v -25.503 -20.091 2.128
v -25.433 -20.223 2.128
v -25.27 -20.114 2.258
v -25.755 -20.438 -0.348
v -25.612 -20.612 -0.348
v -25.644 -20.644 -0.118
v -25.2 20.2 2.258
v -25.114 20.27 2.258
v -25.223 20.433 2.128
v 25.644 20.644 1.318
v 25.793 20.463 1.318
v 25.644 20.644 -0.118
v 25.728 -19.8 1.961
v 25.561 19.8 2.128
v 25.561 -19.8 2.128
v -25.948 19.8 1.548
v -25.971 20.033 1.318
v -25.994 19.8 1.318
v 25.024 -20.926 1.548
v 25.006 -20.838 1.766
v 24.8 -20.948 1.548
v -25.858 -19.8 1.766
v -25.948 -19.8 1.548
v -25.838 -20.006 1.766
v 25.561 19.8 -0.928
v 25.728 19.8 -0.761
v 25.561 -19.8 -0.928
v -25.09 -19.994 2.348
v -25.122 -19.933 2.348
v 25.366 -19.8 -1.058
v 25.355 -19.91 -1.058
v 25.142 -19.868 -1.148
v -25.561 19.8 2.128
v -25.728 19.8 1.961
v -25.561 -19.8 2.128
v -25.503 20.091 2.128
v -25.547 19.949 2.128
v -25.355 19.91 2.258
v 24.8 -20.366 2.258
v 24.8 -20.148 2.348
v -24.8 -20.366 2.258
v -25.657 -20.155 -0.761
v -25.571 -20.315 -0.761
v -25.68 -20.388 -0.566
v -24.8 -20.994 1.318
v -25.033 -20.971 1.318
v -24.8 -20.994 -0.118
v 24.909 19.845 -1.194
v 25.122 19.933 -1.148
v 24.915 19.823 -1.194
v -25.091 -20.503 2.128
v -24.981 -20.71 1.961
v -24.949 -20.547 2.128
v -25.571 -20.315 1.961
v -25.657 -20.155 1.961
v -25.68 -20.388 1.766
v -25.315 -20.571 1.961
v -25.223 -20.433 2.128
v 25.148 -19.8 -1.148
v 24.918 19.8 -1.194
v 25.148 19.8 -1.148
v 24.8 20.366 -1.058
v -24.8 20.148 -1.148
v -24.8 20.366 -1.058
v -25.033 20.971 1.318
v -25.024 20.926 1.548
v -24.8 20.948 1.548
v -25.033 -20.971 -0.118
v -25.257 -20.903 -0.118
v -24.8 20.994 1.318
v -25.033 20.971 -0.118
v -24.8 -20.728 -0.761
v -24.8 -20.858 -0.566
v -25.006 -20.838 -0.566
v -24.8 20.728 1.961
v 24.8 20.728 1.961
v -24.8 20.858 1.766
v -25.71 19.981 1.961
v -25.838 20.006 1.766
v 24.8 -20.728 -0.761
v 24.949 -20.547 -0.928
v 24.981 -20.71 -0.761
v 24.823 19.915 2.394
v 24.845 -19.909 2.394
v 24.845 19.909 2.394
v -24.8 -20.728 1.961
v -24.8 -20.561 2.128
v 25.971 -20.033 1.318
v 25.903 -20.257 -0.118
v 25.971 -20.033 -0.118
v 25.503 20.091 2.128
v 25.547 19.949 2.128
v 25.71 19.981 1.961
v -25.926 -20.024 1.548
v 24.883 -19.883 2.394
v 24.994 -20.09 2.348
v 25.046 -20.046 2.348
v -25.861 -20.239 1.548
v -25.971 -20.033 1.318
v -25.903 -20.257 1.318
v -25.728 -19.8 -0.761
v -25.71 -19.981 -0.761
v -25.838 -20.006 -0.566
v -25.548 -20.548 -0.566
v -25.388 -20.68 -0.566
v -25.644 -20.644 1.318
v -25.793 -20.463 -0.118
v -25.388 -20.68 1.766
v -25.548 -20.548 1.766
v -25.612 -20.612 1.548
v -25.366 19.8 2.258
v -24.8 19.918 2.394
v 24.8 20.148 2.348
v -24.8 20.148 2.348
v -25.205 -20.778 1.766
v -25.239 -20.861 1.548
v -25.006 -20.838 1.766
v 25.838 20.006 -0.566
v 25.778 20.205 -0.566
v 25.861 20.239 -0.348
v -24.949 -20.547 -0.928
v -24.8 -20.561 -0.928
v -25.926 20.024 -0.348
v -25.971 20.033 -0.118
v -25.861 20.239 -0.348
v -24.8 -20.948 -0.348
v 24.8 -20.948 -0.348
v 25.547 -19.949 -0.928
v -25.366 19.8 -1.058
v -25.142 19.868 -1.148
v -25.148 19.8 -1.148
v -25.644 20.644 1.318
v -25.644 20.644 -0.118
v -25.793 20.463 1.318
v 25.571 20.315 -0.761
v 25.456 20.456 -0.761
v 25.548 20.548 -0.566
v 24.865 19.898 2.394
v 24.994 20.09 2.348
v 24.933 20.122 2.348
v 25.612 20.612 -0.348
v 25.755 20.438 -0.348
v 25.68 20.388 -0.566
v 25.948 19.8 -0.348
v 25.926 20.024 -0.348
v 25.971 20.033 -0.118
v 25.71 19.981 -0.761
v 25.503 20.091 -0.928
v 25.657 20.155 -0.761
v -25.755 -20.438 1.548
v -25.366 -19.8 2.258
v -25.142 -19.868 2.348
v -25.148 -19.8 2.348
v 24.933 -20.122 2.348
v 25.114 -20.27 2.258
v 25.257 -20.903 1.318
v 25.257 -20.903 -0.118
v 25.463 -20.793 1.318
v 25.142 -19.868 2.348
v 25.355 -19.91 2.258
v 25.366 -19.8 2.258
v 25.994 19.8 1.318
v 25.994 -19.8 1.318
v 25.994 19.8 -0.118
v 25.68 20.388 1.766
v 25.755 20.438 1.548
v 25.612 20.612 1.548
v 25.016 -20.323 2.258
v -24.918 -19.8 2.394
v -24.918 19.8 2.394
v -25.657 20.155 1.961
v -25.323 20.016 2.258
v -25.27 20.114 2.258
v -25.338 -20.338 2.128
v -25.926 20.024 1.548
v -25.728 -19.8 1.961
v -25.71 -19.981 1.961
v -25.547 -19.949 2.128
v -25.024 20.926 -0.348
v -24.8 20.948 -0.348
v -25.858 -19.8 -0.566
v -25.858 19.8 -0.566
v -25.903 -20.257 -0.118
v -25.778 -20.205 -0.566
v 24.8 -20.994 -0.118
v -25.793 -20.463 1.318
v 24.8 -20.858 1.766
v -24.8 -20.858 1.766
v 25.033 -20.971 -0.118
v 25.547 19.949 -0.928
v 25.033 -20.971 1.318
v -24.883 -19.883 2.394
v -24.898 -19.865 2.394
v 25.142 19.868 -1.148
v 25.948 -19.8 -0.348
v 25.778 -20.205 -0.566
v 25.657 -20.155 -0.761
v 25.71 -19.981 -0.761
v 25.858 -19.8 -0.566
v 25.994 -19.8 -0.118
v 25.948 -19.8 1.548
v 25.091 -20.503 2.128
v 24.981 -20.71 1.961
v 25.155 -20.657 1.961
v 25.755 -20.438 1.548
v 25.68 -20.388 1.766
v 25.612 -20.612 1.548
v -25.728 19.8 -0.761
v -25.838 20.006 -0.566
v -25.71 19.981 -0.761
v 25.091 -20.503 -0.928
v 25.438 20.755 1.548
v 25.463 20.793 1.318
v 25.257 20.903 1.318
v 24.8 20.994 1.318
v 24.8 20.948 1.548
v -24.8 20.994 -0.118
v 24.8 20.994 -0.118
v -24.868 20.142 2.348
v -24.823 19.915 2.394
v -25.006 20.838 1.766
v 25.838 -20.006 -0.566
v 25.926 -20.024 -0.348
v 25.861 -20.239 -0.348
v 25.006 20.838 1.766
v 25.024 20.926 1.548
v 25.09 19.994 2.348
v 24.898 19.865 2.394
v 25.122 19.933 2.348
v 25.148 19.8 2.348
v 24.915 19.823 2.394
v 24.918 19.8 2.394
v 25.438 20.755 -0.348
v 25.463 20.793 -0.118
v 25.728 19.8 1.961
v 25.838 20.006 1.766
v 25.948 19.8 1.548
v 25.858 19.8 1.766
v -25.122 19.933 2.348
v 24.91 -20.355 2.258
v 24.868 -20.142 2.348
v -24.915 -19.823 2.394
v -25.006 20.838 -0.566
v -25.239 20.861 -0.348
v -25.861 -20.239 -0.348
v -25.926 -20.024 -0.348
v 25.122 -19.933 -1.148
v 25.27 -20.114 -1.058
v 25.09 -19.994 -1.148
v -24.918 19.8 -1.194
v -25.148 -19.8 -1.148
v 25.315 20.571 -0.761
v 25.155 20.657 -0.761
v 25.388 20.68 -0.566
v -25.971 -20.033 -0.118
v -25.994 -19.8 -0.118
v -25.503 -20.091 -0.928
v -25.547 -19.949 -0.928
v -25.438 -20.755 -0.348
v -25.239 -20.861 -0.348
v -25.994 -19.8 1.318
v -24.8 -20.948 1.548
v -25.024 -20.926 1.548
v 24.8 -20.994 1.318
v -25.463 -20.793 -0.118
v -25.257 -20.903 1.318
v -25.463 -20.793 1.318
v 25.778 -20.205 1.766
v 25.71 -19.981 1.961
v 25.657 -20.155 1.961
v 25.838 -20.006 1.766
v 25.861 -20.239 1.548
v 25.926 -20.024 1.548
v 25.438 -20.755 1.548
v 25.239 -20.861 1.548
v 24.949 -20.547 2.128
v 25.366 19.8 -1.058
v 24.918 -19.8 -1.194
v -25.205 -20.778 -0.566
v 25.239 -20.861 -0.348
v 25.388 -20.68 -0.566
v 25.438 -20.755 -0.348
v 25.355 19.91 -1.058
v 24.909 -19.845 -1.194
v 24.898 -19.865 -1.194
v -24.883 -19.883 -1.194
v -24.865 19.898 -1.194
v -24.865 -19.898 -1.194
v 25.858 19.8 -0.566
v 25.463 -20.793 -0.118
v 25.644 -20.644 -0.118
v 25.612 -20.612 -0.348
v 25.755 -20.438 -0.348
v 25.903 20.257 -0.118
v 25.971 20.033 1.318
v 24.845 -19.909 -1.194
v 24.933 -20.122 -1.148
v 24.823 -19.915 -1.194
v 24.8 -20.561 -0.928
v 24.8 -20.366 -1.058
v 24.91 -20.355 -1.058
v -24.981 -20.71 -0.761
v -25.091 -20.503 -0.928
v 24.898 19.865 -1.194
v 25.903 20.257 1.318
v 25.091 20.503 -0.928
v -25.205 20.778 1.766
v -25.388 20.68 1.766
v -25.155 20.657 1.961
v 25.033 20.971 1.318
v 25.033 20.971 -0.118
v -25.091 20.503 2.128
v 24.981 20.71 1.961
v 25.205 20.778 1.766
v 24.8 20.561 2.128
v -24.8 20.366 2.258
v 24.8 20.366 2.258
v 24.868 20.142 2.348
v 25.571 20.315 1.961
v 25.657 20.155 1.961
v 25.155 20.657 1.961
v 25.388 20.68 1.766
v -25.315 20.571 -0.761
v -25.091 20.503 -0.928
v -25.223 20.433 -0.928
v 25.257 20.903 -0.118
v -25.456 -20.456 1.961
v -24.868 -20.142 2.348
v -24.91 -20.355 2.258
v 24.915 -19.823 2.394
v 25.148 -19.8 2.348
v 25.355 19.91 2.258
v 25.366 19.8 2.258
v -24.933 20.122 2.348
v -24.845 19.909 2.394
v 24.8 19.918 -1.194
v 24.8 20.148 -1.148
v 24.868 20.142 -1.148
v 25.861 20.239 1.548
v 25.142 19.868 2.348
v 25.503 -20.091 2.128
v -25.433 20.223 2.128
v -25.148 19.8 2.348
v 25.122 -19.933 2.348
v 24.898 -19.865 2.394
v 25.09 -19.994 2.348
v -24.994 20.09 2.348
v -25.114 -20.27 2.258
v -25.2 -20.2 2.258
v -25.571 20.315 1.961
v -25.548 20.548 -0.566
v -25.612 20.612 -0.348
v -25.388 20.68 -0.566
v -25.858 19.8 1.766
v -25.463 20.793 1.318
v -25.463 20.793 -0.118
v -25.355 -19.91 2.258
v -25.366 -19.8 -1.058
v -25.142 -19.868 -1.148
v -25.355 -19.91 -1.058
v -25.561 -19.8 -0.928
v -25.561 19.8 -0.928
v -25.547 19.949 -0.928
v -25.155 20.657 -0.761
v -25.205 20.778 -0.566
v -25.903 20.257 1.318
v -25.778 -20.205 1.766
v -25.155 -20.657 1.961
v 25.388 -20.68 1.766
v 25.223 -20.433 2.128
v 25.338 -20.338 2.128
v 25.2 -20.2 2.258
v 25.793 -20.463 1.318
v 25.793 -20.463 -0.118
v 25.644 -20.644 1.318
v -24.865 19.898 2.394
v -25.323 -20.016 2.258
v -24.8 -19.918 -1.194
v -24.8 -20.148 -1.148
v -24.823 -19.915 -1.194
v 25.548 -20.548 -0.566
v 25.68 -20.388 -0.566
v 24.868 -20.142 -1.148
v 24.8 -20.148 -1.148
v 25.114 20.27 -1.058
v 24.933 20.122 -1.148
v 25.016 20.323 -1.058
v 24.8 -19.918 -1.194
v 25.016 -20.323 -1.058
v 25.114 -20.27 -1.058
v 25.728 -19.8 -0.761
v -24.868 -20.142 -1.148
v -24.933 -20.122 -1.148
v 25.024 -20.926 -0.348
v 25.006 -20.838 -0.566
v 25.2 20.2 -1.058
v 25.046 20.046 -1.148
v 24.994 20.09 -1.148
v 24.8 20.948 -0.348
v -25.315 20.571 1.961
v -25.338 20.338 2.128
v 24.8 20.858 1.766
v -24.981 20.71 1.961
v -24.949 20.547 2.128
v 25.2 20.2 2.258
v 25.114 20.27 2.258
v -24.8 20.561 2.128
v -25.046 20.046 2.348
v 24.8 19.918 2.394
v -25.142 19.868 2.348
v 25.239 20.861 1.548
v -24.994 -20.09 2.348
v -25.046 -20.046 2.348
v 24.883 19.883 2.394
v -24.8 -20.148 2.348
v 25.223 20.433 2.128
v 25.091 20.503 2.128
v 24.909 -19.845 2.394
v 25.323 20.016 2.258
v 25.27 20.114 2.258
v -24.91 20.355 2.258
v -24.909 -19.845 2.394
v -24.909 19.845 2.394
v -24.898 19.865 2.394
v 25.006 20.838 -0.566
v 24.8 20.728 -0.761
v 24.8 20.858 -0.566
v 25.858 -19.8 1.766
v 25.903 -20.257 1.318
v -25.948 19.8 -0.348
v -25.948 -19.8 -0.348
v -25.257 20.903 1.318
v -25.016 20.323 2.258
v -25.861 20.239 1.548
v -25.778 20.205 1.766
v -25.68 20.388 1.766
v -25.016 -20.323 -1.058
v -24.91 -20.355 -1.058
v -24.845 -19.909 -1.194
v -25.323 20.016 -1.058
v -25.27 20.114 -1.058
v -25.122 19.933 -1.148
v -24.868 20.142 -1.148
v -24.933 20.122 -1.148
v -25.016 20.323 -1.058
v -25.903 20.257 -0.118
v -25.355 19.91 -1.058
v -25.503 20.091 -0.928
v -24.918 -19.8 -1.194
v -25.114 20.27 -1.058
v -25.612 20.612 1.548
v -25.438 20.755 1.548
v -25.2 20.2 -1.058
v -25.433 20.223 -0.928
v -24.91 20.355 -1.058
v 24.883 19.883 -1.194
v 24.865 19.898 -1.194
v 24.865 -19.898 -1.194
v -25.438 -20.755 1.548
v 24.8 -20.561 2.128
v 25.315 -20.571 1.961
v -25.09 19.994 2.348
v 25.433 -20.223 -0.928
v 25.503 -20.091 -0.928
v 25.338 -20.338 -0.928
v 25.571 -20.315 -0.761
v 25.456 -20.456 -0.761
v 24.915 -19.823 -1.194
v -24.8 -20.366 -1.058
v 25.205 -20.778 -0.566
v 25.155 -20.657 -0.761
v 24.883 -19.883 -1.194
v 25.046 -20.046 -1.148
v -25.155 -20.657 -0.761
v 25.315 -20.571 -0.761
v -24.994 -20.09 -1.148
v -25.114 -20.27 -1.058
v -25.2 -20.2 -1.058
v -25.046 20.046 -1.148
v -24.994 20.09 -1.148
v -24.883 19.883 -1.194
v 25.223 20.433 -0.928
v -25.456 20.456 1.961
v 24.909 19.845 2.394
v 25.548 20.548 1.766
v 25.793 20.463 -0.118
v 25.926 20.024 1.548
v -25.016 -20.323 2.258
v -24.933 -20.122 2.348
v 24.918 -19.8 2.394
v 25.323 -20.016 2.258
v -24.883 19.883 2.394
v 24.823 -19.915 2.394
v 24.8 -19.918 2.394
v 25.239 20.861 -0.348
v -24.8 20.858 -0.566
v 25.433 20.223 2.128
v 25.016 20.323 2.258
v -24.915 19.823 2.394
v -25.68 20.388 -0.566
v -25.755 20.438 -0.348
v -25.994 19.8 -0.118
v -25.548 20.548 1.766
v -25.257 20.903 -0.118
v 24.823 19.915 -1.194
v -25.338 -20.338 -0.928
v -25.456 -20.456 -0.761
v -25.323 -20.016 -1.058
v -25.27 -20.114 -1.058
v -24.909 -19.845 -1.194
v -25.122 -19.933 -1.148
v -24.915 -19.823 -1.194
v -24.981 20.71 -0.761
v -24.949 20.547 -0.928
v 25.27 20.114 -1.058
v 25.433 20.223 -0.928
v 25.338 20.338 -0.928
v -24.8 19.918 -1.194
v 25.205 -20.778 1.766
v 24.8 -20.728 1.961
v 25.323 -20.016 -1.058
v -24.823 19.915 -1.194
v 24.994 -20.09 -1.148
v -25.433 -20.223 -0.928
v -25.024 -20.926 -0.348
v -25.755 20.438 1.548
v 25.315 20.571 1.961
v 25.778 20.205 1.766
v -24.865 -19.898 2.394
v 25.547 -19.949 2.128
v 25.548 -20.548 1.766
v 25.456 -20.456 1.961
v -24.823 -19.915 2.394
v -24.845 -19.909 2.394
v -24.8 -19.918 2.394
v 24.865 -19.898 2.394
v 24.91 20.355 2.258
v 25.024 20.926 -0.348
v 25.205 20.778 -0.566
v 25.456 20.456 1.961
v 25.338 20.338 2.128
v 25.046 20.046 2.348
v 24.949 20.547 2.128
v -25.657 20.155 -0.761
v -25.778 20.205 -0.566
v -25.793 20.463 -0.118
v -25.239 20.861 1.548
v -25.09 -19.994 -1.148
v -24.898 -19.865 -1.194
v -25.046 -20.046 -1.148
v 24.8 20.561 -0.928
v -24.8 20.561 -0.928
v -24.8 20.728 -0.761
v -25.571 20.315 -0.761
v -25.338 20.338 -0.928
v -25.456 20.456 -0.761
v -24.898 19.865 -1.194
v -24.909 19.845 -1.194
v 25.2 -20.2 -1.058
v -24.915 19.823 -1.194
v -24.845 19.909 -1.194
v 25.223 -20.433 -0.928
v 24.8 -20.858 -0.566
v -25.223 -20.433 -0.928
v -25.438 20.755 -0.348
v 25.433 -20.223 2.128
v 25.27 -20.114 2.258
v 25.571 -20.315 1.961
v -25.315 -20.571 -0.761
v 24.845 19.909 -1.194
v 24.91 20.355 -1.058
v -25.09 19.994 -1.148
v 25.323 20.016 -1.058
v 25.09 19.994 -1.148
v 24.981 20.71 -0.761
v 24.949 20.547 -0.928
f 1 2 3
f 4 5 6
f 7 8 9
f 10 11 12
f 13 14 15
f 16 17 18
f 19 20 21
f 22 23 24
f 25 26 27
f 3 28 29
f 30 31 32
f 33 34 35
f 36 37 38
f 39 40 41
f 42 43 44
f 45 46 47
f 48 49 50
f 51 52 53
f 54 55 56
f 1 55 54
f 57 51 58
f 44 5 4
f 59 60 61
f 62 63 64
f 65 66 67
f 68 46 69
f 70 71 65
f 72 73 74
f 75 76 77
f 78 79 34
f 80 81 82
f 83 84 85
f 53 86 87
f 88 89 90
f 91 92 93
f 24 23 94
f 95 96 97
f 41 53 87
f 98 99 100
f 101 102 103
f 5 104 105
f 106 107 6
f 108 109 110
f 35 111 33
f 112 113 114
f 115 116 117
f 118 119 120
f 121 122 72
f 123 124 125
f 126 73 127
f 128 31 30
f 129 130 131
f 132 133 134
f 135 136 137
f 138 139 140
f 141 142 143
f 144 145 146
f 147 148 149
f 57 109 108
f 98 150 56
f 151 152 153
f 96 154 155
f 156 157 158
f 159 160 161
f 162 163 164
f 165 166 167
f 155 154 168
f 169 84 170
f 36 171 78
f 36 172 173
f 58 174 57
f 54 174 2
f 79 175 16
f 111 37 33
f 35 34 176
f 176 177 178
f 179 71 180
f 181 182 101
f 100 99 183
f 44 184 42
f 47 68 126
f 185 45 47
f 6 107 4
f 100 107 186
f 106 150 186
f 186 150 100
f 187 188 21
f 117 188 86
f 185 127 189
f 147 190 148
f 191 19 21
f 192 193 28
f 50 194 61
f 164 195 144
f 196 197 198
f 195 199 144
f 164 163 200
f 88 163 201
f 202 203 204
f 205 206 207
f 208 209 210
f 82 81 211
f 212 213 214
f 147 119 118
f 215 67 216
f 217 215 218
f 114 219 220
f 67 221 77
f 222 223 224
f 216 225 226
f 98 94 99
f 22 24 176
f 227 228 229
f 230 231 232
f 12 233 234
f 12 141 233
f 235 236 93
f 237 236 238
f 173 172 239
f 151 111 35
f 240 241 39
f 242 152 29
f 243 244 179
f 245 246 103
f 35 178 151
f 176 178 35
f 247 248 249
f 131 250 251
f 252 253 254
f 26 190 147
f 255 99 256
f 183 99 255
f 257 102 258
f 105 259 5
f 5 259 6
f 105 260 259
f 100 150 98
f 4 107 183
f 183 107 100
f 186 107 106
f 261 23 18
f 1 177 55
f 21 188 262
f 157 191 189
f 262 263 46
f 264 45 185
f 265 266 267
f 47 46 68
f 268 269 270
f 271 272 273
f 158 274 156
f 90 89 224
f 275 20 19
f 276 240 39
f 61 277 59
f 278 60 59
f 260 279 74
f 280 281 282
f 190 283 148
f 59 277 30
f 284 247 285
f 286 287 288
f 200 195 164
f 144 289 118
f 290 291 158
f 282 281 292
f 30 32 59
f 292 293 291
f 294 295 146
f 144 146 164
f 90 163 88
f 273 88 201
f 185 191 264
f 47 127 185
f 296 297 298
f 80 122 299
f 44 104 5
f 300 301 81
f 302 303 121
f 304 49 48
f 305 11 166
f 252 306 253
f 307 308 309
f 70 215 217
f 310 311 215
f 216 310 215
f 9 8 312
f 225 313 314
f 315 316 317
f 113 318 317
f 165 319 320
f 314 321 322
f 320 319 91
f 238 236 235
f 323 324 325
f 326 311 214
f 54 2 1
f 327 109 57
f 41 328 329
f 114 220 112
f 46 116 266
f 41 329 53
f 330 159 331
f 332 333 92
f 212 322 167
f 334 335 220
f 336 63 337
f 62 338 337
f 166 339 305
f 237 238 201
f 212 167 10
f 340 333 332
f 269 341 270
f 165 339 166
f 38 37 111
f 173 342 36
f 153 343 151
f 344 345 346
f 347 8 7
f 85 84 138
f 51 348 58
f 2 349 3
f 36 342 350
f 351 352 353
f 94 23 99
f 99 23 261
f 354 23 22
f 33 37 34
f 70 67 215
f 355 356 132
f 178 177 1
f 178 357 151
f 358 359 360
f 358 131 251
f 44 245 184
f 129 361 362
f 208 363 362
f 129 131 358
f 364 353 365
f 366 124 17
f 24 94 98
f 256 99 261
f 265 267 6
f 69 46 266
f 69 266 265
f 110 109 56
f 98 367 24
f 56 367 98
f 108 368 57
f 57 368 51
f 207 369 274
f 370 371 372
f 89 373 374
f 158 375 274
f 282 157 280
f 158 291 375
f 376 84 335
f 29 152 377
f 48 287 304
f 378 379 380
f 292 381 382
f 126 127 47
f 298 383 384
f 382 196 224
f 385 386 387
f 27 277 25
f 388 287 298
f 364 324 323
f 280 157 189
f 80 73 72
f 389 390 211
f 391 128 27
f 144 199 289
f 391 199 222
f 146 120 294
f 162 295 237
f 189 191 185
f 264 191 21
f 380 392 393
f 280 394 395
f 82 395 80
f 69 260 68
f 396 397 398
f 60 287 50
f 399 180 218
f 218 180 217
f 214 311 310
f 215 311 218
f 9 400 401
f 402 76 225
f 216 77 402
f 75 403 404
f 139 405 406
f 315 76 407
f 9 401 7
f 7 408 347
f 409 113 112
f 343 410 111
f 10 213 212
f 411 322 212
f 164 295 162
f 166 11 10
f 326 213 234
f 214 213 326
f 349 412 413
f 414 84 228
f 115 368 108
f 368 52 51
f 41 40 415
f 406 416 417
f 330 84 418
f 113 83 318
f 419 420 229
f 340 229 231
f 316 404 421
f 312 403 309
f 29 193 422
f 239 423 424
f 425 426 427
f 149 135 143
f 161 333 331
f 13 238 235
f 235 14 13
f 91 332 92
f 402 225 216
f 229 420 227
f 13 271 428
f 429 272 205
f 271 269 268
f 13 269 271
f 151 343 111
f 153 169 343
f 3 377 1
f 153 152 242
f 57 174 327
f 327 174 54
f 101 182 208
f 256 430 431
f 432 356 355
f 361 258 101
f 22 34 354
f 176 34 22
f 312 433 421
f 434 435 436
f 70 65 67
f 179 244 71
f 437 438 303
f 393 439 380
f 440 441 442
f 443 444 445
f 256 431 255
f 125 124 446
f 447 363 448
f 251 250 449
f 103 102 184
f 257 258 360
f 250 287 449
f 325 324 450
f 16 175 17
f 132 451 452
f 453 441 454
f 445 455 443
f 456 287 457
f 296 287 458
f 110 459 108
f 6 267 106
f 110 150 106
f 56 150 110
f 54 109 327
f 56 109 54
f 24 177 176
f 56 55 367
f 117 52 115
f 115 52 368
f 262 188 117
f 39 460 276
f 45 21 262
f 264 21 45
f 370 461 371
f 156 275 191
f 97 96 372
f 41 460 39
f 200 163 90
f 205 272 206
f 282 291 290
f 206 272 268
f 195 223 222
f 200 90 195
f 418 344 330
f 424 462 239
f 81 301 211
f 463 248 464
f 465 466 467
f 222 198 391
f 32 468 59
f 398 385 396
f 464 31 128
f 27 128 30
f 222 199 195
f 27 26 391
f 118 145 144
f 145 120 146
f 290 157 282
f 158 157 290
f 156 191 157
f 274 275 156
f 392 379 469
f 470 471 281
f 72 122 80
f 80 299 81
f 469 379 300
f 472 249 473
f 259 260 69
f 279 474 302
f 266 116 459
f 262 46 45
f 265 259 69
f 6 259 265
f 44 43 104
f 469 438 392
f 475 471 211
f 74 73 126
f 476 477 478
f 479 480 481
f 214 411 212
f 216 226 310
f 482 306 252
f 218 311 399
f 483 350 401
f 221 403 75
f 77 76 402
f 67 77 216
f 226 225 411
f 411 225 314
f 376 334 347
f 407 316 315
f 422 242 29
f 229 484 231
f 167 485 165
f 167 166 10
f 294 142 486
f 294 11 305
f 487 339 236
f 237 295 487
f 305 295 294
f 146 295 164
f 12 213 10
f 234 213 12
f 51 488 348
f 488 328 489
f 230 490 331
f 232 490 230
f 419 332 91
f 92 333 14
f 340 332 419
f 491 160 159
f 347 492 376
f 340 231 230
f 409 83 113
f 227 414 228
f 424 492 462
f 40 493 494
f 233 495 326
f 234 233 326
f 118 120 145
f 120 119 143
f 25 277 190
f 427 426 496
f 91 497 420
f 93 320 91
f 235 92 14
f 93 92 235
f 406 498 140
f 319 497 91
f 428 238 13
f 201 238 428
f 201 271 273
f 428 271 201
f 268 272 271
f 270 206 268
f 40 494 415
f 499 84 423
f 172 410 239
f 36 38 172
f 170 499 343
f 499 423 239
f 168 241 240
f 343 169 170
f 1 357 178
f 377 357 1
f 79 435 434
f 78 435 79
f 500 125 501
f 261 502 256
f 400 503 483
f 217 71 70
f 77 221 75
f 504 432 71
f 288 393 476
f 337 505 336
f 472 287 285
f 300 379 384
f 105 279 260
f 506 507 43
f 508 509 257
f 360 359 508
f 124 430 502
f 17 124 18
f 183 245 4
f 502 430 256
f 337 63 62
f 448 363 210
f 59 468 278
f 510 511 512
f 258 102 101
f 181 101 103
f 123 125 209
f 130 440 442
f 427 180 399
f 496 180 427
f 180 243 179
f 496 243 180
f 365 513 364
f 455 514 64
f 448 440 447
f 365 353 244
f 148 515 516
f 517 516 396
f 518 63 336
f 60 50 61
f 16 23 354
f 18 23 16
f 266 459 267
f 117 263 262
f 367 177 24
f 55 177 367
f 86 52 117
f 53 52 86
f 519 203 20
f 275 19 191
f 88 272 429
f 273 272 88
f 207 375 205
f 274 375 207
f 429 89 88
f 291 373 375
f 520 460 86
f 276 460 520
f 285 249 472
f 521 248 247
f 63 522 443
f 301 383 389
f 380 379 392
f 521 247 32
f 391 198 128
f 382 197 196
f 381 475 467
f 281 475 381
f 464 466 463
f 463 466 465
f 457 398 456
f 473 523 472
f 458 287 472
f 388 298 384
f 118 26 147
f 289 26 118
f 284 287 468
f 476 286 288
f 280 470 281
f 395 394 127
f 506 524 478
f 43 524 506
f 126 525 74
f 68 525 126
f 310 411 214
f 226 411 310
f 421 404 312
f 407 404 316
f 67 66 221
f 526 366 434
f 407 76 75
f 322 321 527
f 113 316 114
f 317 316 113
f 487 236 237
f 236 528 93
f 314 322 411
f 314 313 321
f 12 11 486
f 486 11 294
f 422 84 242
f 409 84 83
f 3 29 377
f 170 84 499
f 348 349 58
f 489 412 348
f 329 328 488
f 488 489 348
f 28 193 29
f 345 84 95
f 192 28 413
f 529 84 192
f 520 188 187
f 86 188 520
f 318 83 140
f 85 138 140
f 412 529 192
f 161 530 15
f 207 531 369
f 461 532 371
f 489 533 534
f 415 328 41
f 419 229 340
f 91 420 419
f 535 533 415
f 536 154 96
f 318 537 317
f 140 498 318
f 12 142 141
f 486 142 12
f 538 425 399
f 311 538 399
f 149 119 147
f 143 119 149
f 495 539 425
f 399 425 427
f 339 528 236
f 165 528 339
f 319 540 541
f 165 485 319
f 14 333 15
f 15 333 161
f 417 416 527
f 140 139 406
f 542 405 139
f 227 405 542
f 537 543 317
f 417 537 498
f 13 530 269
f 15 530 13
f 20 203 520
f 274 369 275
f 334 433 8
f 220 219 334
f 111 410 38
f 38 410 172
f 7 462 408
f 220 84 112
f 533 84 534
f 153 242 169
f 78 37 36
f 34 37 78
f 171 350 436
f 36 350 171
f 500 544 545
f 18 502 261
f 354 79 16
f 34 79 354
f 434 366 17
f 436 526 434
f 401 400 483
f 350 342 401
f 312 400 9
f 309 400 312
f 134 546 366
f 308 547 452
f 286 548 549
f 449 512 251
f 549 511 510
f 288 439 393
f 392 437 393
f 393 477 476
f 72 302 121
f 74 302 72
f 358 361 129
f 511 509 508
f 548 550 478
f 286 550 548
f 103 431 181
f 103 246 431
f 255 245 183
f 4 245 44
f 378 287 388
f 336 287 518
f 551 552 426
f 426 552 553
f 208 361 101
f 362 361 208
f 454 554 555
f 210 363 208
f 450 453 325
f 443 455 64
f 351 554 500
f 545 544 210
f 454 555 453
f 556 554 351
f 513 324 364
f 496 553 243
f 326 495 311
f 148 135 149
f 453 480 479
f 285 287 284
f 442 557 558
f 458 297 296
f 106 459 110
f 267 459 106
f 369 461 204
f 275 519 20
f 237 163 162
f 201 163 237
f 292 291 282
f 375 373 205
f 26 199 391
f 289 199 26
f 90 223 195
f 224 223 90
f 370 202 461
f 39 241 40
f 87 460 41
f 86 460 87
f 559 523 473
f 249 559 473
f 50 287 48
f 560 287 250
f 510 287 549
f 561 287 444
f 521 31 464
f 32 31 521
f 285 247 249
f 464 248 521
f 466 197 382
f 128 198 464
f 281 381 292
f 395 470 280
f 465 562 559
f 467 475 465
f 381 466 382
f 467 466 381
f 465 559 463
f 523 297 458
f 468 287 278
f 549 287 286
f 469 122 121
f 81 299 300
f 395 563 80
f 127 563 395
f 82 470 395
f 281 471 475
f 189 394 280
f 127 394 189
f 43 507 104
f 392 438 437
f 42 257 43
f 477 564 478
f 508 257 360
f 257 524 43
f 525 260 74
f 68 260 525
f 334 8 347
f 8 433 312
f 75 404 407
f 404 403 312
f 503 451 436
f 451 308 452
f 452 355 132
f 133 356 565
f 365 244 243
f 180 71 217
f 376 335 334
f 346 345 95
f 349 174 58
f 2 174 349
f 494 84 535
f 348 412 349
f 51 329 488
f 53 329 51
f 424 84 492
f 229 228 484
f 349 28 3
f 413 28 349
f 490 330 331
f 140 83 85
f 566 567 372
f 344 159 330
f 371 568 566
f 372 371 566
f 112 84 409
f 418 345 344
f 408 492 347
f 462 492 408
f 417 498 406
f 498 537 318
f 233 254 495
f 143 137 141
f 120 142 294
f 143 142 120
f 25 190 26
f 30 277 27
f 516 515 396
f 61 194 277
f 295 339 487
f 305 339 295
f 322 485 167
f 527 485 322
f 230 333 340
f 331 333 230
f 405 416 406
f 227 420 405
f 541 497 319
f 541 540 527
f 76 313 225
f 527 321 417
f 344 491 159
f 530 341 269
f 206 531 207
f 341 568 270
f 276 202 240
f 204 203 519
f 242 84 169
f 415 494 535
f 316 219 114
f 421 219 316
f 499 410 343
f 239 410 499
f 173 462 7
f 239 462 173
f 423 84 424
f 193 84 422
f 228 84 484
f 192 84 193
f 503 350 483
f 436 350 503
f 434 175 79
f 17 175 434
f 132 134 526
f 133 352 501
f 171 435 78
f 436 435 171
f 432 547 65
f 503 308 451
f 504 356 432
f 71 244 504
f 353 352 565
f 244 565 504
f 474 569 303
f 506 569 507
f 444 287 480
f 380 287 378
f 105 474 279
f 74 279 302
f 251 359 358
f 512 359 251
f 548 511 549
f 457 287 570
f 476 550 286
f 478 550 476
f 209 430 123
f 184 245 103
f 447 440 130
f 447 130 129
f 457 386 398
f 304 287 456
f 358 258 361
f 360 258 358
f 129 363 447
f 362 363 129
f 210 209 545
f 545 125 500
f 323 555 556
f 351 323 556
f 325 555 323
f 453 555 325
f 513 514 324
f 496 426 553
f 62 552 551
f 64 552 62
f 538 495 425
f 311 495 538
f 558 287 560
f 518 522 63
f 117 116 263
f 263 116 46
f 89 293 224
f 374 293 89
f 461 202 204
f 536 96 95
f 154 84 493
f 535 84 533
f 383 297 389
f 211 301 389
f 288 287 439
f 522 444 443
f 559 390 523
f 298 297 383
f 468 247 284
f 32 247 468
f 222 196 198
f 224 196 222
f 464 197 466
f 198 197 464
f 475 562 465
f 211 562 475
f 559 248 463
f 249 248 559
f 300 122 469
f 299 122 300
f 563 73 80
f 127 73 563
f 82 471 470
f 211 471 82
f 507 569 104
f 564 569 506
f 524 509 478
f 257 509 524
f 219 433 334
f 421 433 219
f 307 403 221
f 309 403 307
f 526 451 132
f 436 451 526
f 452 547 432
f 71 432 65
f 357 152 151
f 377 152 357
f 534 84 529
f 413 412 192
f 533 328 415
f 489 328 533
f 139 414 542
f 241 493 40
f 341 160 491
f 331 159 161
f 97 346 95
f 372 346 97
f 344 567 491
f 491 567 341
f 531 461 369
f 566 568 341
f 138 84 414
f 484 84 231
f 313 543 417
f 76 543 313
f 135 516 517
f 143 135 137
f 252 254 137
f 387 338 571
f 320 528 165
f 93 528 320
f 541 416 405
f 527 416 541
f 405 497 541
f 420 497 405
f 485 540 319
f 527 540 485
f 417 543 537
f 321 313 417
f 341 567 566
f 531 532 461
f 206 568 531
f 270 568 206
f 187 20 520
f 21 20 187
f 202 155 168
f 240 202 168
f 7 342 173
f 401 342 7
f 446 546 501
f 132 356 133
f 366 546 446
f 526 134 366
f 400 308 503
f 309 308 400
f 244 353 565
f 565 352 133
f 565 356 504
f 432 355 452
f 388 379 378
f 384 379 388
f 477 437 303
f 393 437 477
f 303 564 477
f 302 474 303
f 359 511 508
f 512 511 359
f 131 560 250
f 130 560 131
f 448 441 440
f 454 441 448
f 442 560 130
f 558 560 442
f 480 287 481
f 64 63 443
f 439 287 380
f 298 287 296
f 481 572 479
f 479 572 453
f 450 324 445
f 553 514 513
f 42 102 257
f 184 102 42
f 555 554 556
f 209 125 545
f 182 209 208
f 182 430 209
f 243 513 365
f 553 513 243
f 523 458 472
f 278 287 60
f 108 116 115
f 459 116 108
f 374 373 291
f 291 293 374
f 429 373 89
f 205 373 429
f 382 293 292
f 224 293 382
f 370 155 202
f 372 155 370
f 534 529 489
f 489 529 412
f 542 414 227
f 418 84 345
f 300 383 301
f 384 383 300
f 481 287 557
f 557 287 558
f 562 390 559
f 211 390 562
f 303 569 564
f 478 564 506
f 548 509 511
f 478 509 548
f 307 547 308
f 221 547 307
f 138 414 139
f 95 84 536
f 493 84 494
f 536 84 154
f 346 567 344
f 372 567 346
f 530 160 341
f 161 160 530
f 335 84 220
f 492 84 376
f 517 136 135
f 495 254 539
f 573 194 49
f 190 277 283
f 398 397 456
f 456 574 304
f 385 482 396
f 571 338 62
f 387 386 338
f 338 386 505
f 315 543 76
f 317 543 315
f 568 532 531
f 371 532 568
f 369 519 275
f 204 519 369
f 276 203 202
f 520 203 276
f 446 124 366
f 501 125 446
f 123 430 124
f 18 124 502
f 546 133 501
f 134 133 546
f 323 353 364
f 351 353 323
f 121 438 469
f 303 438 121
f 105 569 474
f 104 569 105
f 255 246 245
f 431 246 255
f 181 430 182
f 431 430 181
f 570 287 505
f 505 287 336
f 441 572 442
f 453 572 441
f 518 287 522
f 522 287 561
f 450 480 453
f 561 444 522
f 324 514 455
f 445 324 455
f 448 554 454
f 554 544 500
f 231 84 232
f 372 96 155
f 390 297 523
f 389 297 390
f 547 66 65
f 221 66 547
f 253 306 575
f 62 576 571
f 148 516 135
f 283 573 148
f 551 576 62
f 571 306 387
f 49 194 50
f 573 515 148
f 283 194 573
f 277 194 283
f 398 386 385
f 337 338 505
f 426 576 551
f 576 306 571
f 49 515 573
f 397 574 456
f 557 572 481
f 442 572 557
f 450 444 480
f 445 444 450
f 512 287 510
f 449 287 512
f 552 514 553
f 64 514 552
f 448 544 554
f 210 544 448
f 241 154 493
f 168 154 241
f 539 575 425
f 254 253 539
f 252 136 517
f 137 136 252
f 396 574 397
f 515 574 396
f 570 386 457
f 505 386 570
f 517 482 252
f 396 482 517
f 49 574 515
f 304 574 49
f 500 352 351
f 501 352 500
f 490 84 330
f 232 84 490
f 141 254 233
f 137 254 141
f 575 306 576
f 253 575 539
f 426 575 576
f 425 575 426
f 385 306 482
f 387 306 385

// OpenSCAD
// micro:bit V2 (micro:bit V2) visual source for NexCAD.
// Units: millimeters. Origin: part bottom-center, matching src/parts/library.ts.
// This generated baseline is intentionally simple; refine it with measured details before exporting STL.

$fn = 32;

module rounded_box(size, r = 0.8) {
  hull() {
    for (x = [-size[0] / 2 + r, size[0] / 2 - r])
      for (y = [-size[1] / 2 + r, size[1] / 2 - r]) {
        translate([x, y, r]) sphere(r = r);
        translate([x, y, size[2] - r]) sphere(r = r);
      }
  }
}

color("#2e7d5b") rounded_box([52, 42, 1.2], min(1.2, min(52, 42) / 8));
